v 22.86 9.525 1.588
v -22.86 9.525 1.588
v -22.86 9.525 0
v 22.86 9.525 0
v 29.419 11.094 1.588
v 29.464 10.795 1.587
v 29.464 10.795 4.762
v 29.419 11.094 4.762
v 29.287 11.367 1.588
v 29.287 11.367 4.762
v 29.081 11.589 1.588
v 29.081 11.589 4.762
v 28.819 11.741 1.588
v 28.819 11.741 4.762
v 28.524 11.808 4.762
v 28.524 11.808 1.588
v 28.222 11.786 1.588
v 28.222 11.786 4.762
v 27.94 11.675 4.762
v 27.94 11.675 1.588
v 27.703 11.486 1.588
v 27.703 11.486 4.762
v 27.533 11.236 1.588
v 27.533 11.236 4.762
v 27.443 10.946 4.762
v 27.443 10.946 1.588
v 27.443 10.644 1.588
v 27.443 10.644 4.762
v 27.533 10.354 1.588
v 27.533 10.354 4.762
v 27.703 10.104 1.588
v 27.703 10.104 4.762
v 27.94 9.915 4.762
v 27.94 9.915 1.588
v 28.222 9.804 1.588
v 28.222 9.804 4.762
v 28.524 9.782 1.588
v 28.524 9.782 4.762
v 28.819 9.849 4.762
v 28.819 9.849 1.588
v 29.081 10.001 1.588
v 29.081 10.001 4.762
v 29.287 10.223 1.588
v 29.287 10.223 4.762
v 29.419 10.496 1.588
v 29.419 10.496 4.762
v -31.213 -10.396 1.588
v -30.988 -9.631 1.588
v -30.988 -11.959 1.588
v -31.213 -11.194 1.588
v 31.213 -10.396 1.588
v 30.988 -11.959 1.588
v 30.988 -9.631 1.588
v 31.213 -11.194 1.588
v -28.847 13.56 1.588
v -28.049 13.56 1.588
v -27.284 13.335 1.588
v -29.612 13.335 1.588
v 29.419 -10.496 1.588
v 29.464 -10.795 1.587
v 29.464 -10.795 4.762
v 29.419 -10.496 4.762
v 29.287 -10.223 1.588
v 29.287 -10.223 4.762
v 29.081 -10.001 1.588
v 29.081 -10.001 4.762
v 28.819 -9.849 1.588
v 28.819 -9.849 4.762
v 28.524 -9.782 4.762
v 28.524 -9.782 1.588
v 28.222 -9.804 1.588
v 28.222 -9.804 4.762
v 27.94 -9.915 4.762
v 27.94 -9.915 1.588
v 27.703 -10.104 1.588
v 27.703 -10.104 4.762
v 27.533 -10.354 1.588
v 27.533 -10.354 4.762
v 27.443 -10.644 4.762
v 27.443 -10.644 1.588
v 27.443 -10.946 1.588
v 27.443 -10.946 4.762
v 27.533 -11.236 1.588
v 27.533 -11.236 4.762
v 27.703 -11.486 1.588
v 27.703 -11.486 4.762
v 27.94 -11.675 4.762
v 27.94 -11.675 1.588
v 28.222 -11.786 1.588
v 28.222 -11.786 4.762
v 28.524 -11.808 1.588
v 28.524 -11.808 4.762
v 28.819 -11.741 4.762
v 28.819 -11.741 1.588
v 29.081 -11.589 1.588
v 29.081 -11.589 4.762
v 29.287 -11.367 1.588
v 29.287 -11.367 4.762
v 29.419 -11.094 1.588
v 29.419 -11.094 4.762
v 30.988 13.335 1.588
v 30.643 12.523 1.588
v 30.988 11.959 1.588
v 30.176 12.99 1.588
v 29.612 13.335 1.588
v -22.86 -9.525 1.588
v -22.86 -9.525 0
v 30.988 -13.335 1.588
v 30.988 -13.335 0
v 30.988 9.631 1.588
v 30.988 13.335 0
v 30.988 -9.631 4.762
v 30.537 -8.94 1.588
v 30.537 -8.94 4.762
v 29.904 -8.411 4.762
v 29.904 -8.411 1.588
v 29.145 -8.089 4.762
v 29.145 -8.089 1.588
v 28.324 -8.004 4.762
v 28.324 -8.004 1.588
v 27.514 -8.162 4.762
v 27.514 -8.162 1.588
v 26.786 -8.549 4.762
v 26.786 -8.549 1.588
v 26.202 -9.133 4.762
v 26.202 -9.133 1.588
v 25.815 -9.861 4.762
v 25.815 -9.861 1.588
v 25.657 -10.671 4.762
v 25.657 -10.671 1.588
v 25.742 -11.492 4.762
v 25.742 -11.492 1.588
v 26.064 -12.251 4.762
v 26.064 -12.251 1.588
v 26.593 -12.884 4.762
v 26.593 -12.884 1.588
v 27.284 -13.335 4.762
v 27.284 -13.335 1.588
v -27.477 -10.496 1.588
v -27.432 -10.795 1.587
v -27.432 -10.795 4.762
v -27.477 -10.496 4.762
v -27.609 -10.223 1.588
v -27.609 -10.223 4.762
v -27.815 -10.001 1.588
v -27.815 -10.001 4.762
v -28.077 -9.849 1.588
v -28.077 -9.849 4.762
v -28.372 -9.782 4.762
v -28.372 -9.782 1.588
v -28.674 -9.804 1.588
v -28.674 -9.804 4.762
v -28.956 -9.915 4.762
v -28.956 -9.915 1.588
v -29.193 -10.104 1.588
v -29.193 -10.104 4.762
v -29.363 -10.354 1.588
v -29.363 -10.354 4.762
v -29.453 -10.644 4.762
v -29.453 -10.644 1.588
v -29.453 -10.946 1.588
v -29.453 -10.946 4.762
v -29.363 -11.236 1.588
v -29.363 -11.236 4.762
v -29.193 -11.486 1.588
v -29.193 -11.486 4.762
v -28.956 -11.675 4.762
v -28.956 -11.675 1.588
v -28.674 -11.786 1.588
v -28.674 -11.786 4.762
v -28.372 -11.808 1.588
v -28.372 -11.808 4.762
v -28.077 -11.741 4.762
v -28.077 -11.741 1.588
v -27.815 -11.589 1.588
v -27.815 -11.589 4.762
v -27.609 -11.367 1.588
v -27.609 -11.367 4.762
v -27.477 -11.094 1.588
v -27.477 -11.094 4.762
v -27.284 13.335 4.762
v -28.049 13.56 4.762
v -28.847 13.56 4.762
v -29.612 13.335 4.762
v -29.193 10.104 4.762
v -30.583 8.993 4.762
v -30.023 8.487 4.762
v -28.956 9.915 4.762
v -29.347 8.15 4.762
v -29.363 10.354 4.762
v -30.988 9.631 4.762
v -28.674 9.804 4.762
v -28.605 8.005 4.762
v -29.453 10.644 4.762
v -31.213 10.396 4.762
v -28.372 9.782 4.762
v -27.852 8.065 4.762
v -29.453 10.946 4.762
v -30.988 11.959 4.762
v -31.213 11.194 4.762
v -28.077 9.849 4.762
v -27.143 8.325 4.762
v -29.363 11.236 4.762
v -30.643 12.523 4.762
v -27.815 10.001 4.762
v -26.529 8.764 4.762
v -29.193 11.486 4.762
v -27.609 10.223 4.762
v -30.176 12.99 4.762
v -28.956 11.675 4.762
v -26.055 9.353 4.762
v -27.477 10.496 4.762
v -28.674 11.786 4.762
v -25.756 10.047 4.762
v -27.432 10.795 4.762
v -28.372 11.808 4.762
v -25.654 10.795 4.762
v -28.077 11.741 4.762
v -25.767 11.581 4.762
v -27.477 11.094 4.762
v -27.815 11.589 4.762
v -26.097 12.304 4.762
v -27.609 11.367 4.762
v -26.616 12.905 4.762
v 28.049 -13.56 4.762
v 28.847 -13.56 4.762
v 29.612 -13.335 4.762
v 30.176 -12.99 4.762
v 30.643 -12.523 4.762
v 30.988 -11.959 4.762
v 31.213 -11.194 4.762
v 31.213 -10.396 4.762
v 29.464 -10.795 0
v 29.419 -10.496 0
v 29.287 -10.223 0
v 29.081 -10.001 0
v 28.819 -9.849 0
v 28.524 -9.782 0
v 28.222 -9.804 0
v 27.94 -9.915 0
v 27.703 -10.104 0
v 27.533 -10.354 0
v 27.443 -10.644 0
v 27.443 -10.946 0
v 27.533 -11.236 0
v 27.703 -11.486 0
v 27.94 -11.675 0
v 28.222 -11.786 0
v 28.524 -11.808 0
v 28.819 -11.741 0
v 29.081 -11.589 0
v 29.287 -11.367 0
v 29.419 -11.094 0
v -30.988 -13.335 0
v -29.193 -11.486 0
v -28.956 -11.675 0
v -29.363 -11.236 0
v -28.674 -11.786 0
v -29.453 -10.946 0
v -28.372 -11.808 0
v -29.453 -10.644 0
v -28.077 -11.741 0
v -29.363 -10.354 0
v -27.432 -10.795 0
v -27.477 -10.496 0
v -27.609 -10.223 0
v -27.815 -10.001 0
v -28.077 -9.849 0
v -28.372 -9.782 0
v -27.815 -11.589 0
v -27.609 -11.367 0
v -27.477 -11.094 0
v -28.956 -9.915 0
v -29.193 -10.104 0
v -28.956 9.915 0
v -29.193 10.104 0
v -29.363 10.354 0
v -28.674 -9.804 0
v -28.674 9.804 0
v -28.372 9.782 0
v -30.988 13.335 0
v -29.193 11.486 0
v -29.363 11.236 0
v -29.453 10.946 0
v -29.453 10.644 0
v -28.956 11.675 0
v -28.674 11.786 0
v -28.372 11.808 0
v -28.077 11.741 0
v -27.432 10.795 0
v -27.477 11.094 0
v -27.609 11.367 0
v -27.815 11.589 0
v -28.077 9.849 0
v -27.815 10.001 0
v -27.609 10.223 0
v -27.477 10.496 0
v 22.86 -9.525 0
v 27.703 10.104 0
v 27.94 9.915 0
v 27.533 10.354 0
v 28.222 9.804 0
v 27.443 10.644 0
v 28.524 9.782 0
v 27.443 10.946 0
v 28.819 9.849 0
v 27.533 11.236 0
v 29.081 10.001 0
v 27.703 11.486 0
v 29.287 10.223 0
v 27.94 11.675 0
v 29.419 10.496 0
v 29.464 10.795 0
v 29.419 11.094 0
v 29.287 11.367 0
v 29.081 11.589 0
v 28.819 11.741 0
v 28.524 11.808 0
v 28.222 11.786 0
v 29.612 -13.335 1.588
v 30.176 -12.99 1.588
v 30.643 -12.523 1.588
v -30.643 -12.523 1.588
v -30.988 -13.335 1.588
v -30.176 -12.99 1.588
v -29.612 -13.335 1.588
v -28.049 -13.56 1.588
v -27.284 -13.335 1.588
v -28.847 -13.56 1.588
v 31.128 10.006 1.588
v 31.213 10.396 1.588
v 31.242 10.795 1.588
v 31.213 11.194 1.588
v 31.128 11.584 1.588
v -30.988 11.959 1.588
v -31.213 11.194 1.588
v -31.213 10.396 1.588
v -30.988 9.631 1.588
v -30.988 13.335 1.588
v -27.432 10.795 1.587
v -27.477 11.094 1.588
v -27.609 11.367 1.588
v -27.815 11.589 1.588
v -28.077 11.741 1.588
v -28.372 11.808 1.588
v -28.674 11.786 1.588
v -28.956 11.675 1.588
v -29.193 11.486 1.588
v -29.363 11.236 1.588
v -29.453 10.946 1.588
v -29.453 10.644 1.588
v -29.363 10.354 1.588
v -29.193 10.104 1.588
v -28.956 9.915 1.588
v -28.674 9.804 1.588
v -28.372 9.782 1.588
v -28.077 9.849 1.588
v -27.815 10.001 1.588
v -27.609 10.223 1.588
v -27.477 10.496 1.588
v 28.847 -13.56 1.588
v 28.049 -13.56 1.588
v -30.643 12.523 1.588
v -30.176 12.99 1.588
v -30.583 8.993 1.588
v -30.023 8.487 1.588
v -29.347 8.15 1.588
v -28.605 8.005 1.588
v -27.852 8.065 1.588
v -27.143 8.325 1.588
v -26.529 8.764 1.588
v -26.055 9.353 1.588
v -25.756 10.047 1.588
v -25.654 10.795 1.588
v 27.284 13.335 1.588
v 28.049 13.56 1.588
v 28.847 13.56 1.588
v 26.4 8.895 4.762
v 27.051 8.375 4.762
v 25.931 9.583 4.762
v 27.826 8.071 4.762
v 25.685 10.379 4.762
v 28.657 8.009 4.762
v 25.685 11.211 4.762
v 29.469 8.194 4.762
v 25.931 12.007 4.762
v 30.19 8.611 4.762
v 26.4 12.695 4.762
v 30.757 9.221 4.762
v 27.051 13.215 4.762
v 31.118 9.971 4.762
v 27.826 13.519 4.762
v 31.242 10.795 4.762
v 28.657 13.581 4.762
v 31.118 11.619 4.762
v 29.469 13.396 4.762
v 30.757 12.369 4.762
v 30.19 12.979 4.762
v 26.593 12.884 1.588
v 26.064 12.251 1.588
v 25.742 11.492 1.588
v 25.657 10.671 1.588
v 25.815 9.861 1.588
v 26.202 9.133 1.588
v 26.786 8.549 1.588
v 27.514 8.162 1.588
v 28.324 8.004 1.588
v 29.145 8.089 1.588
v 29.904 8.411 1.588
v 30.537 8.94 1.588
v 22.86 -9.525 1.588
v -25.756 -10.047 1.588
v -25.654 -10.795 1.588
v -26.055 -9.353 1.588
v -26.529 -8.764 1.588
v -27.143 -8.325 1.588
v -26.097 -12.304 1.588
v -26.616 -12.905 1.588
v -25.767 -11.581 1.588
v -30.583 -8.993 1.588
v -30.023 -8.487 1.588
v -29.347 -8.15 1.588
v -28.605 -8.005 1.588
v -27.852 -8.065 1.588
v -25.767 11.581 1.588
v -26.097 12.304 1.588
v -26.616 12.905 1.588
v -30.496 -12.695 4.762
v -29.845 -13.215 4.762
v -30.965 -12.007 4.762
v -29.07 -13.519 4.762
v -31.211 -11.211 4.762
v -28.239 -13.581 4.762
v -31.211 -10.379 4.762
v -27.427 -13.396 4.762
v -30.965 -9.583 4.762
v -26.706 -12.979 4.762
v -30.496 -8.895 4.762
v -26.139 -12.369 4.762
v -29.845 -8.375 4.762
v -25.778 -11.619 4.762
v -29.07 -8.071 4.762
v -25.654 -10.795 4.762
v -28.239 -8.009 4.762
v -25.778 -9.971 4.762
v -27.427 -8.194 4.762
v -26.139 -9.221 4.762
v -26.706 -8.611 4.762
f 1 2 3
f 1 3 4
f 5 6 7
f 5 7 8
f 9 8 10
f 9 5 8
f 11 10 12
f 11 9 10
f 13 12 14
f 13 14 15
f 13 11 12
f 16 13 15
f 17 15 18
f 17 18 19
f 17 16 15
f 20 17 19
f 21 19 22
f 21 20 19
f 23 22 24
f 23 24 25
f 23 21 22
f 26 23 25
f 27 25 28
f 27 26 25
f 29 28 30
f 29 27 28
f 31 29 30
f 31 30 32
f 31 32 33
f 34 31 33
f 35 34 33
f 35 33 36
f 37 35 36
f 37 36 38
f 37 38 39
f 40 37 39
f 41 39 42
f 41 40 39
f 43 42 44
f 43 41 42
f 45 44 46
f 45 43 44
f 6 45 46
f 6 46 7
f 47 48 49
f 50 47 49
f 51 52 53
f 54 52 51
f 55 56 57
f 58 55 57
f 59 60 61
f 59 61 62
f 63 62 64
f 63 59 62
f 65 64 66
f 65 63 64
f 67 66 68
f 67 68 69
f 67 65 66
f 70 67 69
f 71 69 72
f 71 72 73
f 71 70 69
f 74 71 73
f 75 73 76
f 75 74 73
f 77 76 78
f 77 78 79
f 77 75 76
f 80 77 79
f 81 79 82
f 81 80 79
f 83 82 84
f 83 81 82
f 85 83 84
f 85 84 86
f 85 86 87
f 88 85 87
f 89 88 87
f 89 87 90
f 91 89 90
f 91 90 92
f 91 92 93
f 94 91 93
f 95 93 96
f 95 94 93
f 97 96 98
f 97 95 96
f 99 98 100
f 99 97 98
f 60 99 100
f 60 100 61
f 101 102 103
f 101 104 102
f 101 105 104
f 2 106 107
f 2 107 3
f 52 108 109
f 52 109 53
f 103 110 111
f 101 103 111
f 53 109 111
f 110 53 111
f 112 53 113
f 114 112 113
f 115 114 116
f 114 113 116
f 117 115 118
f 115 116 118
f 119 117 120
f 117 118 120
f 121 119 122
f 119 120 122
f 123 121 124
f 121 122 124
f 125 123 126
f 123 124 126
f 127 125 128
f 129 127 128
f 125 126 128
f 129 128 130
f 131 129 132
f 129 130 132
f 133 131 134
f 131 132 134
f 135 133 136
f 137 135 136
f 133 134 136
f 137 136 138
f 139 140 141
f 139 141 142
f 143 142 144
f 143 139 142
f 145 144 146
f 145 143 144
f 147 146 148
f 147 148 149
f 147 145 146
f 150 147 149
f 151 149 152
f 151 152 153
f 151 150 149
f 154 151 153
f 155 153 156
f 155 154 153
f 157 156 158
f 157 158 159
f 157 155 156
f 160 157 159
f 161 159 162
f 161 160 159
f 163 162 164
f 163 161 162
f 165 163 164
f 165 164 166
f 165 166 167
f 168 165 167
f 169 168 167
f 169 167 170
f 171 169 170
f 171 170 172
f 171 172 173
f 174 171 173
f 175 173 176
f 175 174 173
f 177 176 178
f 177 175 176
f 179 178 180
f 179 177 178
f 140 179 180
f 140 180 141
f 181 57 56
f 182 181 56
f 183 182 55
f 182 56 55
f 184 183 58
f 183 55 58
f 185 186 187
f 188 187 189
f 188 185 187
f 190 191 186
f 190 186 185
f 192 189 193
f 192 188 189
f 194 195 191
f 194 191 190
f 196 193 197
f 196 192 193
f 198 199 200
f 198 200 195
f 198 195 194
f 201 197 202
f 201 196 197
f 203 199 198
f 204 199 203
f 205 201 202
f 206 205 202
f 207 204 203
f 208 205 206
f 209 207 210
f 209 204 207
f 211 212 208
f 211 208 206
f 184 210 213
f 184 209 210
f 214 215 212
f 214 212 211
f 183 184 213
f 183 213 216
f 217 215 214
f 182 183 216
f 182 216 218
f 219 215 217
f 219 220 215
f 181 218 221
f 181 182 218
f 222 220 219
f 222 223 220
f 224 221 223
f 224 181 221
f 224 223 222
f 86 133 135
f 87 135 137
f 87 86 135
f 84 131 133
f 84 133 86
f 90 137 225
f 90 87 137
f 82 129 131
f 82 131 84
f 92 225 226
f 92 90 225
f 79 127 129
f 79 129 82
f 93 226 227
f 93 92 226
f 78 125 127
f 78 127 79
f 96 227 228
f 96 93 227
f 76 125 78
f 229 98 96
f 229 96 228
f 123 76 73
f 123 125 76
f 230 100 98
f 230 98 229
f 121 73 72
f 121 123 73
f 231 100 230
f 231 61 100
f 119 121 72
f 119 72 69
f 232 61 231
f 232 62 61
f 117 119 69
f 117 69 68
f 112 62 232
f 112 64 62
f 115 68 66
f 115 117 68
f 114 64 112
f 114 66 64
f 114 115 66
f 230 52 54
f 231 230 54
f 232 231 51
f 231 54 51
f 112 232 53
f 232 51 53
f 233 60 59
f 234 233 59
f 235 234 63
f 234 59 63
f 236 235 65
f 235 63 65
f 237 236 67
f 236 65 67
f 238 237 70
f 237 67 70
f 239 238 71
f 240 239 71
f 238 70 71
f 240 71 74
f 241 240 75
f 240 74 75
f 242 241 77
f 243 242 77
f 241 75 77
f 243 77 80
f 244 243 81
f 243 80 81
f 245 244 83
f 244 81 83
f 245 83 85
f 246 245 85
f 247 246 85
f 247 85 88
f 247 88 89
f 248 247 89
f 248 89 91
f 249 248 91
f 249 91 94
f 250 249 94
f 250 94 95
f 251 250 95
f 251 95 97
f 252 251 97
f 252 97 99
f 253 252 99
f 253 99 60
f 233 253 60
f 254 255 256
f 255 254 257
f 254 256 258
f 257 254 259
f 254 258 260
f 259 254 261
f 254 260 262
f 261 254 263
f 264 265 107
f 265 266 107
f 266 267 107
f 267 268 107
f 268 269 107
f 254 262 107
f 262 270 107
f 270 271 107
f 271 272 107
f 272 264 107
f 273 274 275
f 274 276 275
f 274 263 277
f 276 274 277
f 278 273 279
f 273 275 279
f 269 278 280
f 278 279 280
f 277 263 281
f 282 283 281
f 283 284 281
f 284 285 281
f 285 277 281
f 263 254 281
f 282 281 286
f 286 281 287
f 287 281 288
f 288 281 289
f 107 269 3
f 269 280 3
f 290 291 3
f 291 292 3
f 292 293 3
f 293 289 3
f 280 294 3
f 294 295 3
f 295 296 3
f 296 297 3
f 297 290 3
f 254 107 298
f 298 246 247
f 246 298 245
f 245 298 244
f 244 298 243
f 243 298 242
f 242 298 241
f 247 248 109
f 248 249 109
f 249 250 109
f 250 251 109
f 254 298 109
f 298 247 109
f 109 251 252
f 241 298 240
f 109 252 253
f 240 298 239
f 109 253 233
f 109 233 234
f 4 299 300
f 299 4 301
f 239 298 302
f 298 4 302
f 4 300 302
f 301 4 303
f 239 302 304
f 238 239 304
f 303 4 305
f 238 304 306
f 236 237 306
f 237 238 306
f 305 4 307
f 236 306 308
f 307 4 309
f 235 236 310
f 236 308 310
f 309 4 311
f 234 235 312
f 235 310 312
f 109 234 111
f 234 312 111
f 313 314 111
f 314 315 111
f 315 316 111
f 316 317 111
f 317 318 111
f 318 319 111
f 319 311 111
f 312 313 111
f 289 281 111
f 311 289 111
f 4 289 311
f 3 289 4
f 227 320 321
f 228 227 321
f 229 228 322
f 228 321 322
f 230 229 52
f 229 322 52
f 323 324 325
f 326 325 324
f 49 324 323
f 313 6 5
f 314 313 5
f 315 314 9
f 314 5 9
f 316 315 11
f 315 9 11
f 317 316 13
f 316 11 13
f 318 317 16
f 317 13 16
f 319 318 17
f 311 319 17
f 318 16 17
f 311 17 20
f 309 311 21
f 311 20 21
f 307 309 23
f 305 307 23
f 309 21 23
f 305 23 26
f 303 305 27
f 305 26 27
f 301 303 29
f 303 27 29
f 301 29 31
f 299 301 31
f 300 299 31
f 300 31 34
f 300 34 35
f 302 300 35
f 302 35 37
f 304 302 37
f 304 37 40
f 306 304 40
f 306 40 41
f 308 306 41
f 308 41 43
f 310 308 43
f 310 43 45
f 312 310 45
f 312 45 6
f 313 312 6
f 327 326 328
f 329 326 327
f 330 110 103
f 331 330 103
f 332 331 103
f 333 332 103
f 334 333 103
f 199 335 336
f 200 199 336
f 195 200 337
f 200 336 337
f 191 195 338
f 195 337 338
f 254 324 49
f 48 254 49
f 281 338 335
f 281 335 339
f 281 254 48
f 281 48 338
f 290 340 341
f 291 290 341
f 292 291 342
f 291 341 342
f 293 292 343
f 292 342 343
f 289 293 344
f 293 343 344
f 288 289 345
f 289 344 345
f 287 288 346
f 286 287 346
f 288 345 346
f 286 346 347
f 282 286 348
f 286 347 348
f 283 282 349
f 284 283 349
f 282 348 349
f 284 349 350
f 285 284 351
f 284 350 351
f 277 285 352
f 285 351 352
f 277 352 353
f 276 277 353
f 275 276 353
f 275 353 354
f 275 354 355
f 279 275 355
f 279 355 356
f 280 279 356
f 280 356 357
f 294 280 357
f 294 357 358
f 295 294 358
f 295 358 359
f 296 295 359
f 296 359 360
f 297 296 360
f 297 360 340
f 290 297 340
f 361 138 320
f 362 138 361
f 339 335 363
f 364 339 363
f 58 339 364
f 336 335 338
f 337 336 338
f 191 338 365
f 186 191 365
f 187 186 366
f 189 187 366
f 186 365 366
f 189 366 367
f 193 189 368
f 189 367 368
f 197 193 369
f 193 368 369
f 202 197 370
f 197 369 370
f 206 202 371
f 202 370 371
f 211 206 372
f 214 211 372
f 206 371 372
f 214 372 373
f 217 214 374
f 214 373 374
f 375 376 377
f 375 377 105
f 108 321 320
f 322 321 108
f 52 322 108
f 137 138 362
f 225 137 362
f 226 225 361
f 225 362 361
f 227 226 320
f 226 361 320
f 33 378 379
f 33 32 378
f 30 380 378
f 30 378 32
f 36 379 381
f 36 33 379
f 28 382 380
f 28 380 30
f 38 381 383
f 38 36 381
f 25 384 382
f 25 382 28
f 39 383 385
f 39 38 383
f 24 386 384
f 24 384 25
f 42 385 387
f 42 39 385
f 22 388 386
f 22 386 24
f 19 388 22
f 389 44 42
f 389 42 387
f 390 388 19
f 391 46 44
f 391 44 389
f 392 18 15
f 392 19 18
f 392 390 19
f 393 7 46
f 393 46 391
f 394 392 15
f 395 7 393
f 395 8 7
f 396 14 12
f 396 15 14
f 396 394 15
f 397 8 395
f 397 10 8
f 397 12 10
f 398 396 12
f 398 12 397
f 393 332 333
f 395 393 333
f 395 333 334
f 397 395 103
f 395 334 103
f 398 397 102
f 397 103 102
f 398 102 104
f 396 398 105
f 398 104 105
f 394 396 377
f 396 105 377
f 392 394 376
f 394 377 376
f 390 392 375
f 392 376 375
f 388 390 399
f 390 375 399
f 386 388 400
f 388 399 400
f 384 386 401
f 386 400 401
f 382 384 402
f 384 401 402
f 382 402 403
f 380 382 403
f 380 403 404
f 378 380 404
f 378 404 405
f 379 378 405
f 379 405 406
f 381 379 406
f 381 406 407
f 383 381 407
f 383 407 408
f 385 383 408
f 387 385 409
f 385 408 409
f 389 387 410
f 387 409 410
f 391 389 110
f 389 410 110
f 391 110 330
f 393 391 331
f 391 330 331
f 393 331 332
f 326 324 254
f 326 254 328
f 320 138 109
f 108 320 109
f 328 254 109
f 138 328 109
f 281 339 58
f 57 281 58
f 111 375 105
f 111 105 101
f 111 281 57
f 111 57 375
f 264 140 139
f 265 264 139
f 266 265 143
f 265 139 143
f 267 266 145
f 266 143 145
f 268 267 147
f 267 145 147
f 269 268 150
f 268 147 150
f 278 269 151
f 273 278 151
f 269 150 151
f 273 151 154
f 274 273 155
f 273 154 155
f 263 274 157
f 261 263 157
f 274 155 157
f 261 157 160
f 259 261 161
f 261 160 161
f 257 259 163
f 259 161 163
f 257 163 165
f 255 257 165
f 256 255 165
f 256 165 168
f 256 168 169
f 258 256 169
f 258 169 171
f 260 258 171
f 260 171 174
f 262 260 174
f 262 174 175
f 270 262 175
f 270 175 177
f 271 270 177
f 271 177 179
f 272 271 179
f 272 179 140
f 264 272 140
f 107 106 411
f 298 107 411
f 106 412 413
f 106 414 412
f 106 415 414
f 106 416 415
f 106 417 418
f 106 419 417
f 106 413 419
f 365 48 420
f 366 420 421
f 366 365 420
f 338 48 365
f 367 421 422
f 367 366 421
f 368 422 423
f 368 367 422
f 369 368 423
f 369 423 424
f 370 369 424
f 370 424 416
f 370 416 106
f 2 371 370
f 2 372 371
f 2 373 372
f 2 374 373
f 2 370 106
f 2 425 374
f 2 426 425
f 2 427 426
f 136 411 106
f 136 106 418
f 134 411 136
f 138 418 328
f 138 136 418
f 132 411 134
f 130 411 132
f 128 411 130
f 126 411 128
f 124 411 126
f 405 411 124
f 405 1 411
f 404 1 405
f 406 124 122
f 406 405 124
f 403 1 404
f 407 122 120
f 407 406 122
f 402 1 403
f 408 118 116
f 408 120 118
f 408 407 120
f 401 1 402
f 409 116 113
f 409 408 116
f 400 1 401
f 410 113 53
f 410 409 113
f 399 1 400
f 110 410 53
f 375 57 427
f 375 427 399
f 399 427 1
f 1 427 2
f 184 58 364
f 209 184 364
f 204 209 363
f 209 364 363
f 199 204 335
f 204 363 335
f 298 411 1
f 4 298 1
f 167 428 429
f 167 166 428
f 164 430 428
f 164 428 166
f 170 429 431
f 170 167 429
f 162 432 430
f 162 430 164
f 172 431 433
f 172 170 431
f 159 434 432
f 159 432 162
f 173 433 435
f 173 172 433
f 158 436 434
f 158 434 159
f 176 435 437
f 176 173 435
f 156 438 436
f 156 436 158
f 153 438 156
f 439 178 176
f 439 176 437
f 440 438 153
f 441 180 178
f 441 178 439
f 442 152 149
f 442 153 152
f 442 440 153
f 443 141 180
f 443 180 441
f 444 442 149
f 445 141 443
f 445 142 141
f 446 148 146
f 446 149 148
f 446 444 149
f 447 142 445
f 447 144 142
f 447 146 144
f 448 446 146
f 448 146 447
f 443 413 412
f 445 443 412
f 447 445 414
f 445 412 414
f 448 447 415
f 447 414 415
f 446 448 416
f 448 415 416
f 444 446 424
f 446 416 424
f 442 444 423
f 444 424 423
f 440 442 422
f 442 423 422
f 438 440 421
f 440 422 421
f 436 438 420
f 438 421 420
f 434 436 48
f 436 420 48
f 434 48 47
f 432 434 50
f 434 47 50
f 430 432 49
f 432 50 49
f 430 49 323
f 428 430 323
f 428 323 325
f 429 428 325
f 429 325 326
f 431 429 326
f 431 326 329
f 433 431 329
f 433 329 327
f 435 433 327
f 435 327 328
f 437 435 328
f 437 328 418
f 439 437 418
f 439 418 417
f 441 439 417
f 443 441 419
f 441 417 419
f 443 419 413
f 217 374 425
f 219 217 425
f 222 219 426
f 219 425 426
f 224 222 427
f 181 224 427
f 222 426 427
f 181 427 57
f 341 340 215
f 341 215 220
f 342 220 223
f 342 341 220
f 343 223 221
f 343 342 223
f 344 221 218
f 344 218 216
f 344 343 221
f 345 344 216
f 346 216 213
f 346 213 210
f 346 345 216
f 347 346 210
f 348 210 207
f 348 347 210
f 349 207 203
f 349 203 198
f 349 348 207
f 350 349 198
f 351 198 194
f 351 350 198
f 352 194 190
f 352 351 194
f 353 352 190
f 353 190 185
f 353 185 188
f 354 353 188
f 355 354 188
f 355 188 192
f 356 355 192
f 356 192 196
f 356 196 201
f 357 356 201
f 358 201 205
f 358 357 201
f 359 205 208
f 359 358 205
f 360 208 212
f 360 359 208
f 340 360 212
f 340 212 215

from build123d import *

# Parameters (mm, degrees)
F0_W     = 61.976
F0_H     = 26.67
F1_DEPTH = 1.5875
F2_R     = 1.016
F2_R_2   = 2.794
F3_DEPTH = 3.175
F4_DEPTH = 12.7
F5_W     = 45.72
F5_H     = 19.05
F6_DEPTH = 6.35


with BuildPart() as f1:
    # F0 (on Top) → F1 (new body)
    with BuildSketch(Plane.XY):
        Rectangle(F0_W, F0_H)
    extrude(amount=F1_DEPTH)

    # F2 (on face) → F3 (join)
    with BuildSketch(Plane.XY.offset(1.5875)):
        with BuildLine():
            ThreePointArc((-25.654, 10.795), (-26.096556, 12.304022), (-27.284026, 13.335))
            Line((-27.284026, 13.335), (-29.611974, 13.335))
            ThreePointArc((-29.611974, 13.335), (-30.423656, 12.770656), (-30.988, 11.958974))
            Line((-30.988, 11.958974), (-30.988, 9.631026))
            ThreePointArc((-30.988, 9.631026), (-27.852317, 8.065238), (-25.654, 10.795))
        make_face()
        with Locations((-28.448, 10.795)):
            Circle(F2_R, mode=Mode.SUBTRACT)
        with Locations((28.448, -10.795)):
            Circle(F2_R_2)
        with Locations((28.448, -10.795)):
            Circle(F2_R, mode=Mode.SUBTRACT)
        with Locations((-28.448, 10.795)):
            Circle(F2_R_2)
        with Locations((-28.448, 10.795)):
            Circle(F2_R, mode=Mode.SUBTRACT)
        with Locations((-28.448, -10.795)):
            Circle(F2_R_2)
        with Locations((-28.448, -10.795)):
            Circle(F2_R, mode=Mode.SUBTRACT)
        with Locations((28.448, 10.795)):
            Circle(F2_R_2)
        with Locations((28.448, 10.795)):
            Circle(F2_R, mode=Mode.SUBTRACT)
        with BuildLine():
            Line((30.988, -11.958974), (30.988, -9.631026))
            ThreePointArc((30.988, -9.631026), (26.472344, -8.819344), (27.284026, -13.335))
            Line((27.284026, -13.335), (29.611974, -13.335))
            ThreePointArc((29.611974, -13.335), (30.423656, -12.770656), (30.988, -11.958974))
        make_face()
        with Locations((28.448, -10.795)):
            Circle(F2_R, mode=Mode.SUBTRACT)
    extrude(amount=F3_DEPTH)

    # F2 (on face) → F4 (cut)
    with BuildSketch(Plane.XY.offset(1.5875)):
        with Locations((-28.448, 10.795)):
            Circle(F2_R)
        with Locations((28.448, -10.795)):
            Circle(F2_R)
        with Locations((28.448, 10.795)):
            Circle(F2_R)
        with Locations((-28.448, -10.795)):
            Circle(F2_R)
    extrude(amount=-F4_DEPTH, mode=Mode.SUBTRACT)

    # F5 (on face) → F6 (cut)
    with BuildSketch(Plane.XY.offset(1.5875)):
        Rectangle(F5_W, F5_H)
    extrude(amount=-F6_DEPTH, mode=Mode.SUBTRACT)


solid = f1.part
